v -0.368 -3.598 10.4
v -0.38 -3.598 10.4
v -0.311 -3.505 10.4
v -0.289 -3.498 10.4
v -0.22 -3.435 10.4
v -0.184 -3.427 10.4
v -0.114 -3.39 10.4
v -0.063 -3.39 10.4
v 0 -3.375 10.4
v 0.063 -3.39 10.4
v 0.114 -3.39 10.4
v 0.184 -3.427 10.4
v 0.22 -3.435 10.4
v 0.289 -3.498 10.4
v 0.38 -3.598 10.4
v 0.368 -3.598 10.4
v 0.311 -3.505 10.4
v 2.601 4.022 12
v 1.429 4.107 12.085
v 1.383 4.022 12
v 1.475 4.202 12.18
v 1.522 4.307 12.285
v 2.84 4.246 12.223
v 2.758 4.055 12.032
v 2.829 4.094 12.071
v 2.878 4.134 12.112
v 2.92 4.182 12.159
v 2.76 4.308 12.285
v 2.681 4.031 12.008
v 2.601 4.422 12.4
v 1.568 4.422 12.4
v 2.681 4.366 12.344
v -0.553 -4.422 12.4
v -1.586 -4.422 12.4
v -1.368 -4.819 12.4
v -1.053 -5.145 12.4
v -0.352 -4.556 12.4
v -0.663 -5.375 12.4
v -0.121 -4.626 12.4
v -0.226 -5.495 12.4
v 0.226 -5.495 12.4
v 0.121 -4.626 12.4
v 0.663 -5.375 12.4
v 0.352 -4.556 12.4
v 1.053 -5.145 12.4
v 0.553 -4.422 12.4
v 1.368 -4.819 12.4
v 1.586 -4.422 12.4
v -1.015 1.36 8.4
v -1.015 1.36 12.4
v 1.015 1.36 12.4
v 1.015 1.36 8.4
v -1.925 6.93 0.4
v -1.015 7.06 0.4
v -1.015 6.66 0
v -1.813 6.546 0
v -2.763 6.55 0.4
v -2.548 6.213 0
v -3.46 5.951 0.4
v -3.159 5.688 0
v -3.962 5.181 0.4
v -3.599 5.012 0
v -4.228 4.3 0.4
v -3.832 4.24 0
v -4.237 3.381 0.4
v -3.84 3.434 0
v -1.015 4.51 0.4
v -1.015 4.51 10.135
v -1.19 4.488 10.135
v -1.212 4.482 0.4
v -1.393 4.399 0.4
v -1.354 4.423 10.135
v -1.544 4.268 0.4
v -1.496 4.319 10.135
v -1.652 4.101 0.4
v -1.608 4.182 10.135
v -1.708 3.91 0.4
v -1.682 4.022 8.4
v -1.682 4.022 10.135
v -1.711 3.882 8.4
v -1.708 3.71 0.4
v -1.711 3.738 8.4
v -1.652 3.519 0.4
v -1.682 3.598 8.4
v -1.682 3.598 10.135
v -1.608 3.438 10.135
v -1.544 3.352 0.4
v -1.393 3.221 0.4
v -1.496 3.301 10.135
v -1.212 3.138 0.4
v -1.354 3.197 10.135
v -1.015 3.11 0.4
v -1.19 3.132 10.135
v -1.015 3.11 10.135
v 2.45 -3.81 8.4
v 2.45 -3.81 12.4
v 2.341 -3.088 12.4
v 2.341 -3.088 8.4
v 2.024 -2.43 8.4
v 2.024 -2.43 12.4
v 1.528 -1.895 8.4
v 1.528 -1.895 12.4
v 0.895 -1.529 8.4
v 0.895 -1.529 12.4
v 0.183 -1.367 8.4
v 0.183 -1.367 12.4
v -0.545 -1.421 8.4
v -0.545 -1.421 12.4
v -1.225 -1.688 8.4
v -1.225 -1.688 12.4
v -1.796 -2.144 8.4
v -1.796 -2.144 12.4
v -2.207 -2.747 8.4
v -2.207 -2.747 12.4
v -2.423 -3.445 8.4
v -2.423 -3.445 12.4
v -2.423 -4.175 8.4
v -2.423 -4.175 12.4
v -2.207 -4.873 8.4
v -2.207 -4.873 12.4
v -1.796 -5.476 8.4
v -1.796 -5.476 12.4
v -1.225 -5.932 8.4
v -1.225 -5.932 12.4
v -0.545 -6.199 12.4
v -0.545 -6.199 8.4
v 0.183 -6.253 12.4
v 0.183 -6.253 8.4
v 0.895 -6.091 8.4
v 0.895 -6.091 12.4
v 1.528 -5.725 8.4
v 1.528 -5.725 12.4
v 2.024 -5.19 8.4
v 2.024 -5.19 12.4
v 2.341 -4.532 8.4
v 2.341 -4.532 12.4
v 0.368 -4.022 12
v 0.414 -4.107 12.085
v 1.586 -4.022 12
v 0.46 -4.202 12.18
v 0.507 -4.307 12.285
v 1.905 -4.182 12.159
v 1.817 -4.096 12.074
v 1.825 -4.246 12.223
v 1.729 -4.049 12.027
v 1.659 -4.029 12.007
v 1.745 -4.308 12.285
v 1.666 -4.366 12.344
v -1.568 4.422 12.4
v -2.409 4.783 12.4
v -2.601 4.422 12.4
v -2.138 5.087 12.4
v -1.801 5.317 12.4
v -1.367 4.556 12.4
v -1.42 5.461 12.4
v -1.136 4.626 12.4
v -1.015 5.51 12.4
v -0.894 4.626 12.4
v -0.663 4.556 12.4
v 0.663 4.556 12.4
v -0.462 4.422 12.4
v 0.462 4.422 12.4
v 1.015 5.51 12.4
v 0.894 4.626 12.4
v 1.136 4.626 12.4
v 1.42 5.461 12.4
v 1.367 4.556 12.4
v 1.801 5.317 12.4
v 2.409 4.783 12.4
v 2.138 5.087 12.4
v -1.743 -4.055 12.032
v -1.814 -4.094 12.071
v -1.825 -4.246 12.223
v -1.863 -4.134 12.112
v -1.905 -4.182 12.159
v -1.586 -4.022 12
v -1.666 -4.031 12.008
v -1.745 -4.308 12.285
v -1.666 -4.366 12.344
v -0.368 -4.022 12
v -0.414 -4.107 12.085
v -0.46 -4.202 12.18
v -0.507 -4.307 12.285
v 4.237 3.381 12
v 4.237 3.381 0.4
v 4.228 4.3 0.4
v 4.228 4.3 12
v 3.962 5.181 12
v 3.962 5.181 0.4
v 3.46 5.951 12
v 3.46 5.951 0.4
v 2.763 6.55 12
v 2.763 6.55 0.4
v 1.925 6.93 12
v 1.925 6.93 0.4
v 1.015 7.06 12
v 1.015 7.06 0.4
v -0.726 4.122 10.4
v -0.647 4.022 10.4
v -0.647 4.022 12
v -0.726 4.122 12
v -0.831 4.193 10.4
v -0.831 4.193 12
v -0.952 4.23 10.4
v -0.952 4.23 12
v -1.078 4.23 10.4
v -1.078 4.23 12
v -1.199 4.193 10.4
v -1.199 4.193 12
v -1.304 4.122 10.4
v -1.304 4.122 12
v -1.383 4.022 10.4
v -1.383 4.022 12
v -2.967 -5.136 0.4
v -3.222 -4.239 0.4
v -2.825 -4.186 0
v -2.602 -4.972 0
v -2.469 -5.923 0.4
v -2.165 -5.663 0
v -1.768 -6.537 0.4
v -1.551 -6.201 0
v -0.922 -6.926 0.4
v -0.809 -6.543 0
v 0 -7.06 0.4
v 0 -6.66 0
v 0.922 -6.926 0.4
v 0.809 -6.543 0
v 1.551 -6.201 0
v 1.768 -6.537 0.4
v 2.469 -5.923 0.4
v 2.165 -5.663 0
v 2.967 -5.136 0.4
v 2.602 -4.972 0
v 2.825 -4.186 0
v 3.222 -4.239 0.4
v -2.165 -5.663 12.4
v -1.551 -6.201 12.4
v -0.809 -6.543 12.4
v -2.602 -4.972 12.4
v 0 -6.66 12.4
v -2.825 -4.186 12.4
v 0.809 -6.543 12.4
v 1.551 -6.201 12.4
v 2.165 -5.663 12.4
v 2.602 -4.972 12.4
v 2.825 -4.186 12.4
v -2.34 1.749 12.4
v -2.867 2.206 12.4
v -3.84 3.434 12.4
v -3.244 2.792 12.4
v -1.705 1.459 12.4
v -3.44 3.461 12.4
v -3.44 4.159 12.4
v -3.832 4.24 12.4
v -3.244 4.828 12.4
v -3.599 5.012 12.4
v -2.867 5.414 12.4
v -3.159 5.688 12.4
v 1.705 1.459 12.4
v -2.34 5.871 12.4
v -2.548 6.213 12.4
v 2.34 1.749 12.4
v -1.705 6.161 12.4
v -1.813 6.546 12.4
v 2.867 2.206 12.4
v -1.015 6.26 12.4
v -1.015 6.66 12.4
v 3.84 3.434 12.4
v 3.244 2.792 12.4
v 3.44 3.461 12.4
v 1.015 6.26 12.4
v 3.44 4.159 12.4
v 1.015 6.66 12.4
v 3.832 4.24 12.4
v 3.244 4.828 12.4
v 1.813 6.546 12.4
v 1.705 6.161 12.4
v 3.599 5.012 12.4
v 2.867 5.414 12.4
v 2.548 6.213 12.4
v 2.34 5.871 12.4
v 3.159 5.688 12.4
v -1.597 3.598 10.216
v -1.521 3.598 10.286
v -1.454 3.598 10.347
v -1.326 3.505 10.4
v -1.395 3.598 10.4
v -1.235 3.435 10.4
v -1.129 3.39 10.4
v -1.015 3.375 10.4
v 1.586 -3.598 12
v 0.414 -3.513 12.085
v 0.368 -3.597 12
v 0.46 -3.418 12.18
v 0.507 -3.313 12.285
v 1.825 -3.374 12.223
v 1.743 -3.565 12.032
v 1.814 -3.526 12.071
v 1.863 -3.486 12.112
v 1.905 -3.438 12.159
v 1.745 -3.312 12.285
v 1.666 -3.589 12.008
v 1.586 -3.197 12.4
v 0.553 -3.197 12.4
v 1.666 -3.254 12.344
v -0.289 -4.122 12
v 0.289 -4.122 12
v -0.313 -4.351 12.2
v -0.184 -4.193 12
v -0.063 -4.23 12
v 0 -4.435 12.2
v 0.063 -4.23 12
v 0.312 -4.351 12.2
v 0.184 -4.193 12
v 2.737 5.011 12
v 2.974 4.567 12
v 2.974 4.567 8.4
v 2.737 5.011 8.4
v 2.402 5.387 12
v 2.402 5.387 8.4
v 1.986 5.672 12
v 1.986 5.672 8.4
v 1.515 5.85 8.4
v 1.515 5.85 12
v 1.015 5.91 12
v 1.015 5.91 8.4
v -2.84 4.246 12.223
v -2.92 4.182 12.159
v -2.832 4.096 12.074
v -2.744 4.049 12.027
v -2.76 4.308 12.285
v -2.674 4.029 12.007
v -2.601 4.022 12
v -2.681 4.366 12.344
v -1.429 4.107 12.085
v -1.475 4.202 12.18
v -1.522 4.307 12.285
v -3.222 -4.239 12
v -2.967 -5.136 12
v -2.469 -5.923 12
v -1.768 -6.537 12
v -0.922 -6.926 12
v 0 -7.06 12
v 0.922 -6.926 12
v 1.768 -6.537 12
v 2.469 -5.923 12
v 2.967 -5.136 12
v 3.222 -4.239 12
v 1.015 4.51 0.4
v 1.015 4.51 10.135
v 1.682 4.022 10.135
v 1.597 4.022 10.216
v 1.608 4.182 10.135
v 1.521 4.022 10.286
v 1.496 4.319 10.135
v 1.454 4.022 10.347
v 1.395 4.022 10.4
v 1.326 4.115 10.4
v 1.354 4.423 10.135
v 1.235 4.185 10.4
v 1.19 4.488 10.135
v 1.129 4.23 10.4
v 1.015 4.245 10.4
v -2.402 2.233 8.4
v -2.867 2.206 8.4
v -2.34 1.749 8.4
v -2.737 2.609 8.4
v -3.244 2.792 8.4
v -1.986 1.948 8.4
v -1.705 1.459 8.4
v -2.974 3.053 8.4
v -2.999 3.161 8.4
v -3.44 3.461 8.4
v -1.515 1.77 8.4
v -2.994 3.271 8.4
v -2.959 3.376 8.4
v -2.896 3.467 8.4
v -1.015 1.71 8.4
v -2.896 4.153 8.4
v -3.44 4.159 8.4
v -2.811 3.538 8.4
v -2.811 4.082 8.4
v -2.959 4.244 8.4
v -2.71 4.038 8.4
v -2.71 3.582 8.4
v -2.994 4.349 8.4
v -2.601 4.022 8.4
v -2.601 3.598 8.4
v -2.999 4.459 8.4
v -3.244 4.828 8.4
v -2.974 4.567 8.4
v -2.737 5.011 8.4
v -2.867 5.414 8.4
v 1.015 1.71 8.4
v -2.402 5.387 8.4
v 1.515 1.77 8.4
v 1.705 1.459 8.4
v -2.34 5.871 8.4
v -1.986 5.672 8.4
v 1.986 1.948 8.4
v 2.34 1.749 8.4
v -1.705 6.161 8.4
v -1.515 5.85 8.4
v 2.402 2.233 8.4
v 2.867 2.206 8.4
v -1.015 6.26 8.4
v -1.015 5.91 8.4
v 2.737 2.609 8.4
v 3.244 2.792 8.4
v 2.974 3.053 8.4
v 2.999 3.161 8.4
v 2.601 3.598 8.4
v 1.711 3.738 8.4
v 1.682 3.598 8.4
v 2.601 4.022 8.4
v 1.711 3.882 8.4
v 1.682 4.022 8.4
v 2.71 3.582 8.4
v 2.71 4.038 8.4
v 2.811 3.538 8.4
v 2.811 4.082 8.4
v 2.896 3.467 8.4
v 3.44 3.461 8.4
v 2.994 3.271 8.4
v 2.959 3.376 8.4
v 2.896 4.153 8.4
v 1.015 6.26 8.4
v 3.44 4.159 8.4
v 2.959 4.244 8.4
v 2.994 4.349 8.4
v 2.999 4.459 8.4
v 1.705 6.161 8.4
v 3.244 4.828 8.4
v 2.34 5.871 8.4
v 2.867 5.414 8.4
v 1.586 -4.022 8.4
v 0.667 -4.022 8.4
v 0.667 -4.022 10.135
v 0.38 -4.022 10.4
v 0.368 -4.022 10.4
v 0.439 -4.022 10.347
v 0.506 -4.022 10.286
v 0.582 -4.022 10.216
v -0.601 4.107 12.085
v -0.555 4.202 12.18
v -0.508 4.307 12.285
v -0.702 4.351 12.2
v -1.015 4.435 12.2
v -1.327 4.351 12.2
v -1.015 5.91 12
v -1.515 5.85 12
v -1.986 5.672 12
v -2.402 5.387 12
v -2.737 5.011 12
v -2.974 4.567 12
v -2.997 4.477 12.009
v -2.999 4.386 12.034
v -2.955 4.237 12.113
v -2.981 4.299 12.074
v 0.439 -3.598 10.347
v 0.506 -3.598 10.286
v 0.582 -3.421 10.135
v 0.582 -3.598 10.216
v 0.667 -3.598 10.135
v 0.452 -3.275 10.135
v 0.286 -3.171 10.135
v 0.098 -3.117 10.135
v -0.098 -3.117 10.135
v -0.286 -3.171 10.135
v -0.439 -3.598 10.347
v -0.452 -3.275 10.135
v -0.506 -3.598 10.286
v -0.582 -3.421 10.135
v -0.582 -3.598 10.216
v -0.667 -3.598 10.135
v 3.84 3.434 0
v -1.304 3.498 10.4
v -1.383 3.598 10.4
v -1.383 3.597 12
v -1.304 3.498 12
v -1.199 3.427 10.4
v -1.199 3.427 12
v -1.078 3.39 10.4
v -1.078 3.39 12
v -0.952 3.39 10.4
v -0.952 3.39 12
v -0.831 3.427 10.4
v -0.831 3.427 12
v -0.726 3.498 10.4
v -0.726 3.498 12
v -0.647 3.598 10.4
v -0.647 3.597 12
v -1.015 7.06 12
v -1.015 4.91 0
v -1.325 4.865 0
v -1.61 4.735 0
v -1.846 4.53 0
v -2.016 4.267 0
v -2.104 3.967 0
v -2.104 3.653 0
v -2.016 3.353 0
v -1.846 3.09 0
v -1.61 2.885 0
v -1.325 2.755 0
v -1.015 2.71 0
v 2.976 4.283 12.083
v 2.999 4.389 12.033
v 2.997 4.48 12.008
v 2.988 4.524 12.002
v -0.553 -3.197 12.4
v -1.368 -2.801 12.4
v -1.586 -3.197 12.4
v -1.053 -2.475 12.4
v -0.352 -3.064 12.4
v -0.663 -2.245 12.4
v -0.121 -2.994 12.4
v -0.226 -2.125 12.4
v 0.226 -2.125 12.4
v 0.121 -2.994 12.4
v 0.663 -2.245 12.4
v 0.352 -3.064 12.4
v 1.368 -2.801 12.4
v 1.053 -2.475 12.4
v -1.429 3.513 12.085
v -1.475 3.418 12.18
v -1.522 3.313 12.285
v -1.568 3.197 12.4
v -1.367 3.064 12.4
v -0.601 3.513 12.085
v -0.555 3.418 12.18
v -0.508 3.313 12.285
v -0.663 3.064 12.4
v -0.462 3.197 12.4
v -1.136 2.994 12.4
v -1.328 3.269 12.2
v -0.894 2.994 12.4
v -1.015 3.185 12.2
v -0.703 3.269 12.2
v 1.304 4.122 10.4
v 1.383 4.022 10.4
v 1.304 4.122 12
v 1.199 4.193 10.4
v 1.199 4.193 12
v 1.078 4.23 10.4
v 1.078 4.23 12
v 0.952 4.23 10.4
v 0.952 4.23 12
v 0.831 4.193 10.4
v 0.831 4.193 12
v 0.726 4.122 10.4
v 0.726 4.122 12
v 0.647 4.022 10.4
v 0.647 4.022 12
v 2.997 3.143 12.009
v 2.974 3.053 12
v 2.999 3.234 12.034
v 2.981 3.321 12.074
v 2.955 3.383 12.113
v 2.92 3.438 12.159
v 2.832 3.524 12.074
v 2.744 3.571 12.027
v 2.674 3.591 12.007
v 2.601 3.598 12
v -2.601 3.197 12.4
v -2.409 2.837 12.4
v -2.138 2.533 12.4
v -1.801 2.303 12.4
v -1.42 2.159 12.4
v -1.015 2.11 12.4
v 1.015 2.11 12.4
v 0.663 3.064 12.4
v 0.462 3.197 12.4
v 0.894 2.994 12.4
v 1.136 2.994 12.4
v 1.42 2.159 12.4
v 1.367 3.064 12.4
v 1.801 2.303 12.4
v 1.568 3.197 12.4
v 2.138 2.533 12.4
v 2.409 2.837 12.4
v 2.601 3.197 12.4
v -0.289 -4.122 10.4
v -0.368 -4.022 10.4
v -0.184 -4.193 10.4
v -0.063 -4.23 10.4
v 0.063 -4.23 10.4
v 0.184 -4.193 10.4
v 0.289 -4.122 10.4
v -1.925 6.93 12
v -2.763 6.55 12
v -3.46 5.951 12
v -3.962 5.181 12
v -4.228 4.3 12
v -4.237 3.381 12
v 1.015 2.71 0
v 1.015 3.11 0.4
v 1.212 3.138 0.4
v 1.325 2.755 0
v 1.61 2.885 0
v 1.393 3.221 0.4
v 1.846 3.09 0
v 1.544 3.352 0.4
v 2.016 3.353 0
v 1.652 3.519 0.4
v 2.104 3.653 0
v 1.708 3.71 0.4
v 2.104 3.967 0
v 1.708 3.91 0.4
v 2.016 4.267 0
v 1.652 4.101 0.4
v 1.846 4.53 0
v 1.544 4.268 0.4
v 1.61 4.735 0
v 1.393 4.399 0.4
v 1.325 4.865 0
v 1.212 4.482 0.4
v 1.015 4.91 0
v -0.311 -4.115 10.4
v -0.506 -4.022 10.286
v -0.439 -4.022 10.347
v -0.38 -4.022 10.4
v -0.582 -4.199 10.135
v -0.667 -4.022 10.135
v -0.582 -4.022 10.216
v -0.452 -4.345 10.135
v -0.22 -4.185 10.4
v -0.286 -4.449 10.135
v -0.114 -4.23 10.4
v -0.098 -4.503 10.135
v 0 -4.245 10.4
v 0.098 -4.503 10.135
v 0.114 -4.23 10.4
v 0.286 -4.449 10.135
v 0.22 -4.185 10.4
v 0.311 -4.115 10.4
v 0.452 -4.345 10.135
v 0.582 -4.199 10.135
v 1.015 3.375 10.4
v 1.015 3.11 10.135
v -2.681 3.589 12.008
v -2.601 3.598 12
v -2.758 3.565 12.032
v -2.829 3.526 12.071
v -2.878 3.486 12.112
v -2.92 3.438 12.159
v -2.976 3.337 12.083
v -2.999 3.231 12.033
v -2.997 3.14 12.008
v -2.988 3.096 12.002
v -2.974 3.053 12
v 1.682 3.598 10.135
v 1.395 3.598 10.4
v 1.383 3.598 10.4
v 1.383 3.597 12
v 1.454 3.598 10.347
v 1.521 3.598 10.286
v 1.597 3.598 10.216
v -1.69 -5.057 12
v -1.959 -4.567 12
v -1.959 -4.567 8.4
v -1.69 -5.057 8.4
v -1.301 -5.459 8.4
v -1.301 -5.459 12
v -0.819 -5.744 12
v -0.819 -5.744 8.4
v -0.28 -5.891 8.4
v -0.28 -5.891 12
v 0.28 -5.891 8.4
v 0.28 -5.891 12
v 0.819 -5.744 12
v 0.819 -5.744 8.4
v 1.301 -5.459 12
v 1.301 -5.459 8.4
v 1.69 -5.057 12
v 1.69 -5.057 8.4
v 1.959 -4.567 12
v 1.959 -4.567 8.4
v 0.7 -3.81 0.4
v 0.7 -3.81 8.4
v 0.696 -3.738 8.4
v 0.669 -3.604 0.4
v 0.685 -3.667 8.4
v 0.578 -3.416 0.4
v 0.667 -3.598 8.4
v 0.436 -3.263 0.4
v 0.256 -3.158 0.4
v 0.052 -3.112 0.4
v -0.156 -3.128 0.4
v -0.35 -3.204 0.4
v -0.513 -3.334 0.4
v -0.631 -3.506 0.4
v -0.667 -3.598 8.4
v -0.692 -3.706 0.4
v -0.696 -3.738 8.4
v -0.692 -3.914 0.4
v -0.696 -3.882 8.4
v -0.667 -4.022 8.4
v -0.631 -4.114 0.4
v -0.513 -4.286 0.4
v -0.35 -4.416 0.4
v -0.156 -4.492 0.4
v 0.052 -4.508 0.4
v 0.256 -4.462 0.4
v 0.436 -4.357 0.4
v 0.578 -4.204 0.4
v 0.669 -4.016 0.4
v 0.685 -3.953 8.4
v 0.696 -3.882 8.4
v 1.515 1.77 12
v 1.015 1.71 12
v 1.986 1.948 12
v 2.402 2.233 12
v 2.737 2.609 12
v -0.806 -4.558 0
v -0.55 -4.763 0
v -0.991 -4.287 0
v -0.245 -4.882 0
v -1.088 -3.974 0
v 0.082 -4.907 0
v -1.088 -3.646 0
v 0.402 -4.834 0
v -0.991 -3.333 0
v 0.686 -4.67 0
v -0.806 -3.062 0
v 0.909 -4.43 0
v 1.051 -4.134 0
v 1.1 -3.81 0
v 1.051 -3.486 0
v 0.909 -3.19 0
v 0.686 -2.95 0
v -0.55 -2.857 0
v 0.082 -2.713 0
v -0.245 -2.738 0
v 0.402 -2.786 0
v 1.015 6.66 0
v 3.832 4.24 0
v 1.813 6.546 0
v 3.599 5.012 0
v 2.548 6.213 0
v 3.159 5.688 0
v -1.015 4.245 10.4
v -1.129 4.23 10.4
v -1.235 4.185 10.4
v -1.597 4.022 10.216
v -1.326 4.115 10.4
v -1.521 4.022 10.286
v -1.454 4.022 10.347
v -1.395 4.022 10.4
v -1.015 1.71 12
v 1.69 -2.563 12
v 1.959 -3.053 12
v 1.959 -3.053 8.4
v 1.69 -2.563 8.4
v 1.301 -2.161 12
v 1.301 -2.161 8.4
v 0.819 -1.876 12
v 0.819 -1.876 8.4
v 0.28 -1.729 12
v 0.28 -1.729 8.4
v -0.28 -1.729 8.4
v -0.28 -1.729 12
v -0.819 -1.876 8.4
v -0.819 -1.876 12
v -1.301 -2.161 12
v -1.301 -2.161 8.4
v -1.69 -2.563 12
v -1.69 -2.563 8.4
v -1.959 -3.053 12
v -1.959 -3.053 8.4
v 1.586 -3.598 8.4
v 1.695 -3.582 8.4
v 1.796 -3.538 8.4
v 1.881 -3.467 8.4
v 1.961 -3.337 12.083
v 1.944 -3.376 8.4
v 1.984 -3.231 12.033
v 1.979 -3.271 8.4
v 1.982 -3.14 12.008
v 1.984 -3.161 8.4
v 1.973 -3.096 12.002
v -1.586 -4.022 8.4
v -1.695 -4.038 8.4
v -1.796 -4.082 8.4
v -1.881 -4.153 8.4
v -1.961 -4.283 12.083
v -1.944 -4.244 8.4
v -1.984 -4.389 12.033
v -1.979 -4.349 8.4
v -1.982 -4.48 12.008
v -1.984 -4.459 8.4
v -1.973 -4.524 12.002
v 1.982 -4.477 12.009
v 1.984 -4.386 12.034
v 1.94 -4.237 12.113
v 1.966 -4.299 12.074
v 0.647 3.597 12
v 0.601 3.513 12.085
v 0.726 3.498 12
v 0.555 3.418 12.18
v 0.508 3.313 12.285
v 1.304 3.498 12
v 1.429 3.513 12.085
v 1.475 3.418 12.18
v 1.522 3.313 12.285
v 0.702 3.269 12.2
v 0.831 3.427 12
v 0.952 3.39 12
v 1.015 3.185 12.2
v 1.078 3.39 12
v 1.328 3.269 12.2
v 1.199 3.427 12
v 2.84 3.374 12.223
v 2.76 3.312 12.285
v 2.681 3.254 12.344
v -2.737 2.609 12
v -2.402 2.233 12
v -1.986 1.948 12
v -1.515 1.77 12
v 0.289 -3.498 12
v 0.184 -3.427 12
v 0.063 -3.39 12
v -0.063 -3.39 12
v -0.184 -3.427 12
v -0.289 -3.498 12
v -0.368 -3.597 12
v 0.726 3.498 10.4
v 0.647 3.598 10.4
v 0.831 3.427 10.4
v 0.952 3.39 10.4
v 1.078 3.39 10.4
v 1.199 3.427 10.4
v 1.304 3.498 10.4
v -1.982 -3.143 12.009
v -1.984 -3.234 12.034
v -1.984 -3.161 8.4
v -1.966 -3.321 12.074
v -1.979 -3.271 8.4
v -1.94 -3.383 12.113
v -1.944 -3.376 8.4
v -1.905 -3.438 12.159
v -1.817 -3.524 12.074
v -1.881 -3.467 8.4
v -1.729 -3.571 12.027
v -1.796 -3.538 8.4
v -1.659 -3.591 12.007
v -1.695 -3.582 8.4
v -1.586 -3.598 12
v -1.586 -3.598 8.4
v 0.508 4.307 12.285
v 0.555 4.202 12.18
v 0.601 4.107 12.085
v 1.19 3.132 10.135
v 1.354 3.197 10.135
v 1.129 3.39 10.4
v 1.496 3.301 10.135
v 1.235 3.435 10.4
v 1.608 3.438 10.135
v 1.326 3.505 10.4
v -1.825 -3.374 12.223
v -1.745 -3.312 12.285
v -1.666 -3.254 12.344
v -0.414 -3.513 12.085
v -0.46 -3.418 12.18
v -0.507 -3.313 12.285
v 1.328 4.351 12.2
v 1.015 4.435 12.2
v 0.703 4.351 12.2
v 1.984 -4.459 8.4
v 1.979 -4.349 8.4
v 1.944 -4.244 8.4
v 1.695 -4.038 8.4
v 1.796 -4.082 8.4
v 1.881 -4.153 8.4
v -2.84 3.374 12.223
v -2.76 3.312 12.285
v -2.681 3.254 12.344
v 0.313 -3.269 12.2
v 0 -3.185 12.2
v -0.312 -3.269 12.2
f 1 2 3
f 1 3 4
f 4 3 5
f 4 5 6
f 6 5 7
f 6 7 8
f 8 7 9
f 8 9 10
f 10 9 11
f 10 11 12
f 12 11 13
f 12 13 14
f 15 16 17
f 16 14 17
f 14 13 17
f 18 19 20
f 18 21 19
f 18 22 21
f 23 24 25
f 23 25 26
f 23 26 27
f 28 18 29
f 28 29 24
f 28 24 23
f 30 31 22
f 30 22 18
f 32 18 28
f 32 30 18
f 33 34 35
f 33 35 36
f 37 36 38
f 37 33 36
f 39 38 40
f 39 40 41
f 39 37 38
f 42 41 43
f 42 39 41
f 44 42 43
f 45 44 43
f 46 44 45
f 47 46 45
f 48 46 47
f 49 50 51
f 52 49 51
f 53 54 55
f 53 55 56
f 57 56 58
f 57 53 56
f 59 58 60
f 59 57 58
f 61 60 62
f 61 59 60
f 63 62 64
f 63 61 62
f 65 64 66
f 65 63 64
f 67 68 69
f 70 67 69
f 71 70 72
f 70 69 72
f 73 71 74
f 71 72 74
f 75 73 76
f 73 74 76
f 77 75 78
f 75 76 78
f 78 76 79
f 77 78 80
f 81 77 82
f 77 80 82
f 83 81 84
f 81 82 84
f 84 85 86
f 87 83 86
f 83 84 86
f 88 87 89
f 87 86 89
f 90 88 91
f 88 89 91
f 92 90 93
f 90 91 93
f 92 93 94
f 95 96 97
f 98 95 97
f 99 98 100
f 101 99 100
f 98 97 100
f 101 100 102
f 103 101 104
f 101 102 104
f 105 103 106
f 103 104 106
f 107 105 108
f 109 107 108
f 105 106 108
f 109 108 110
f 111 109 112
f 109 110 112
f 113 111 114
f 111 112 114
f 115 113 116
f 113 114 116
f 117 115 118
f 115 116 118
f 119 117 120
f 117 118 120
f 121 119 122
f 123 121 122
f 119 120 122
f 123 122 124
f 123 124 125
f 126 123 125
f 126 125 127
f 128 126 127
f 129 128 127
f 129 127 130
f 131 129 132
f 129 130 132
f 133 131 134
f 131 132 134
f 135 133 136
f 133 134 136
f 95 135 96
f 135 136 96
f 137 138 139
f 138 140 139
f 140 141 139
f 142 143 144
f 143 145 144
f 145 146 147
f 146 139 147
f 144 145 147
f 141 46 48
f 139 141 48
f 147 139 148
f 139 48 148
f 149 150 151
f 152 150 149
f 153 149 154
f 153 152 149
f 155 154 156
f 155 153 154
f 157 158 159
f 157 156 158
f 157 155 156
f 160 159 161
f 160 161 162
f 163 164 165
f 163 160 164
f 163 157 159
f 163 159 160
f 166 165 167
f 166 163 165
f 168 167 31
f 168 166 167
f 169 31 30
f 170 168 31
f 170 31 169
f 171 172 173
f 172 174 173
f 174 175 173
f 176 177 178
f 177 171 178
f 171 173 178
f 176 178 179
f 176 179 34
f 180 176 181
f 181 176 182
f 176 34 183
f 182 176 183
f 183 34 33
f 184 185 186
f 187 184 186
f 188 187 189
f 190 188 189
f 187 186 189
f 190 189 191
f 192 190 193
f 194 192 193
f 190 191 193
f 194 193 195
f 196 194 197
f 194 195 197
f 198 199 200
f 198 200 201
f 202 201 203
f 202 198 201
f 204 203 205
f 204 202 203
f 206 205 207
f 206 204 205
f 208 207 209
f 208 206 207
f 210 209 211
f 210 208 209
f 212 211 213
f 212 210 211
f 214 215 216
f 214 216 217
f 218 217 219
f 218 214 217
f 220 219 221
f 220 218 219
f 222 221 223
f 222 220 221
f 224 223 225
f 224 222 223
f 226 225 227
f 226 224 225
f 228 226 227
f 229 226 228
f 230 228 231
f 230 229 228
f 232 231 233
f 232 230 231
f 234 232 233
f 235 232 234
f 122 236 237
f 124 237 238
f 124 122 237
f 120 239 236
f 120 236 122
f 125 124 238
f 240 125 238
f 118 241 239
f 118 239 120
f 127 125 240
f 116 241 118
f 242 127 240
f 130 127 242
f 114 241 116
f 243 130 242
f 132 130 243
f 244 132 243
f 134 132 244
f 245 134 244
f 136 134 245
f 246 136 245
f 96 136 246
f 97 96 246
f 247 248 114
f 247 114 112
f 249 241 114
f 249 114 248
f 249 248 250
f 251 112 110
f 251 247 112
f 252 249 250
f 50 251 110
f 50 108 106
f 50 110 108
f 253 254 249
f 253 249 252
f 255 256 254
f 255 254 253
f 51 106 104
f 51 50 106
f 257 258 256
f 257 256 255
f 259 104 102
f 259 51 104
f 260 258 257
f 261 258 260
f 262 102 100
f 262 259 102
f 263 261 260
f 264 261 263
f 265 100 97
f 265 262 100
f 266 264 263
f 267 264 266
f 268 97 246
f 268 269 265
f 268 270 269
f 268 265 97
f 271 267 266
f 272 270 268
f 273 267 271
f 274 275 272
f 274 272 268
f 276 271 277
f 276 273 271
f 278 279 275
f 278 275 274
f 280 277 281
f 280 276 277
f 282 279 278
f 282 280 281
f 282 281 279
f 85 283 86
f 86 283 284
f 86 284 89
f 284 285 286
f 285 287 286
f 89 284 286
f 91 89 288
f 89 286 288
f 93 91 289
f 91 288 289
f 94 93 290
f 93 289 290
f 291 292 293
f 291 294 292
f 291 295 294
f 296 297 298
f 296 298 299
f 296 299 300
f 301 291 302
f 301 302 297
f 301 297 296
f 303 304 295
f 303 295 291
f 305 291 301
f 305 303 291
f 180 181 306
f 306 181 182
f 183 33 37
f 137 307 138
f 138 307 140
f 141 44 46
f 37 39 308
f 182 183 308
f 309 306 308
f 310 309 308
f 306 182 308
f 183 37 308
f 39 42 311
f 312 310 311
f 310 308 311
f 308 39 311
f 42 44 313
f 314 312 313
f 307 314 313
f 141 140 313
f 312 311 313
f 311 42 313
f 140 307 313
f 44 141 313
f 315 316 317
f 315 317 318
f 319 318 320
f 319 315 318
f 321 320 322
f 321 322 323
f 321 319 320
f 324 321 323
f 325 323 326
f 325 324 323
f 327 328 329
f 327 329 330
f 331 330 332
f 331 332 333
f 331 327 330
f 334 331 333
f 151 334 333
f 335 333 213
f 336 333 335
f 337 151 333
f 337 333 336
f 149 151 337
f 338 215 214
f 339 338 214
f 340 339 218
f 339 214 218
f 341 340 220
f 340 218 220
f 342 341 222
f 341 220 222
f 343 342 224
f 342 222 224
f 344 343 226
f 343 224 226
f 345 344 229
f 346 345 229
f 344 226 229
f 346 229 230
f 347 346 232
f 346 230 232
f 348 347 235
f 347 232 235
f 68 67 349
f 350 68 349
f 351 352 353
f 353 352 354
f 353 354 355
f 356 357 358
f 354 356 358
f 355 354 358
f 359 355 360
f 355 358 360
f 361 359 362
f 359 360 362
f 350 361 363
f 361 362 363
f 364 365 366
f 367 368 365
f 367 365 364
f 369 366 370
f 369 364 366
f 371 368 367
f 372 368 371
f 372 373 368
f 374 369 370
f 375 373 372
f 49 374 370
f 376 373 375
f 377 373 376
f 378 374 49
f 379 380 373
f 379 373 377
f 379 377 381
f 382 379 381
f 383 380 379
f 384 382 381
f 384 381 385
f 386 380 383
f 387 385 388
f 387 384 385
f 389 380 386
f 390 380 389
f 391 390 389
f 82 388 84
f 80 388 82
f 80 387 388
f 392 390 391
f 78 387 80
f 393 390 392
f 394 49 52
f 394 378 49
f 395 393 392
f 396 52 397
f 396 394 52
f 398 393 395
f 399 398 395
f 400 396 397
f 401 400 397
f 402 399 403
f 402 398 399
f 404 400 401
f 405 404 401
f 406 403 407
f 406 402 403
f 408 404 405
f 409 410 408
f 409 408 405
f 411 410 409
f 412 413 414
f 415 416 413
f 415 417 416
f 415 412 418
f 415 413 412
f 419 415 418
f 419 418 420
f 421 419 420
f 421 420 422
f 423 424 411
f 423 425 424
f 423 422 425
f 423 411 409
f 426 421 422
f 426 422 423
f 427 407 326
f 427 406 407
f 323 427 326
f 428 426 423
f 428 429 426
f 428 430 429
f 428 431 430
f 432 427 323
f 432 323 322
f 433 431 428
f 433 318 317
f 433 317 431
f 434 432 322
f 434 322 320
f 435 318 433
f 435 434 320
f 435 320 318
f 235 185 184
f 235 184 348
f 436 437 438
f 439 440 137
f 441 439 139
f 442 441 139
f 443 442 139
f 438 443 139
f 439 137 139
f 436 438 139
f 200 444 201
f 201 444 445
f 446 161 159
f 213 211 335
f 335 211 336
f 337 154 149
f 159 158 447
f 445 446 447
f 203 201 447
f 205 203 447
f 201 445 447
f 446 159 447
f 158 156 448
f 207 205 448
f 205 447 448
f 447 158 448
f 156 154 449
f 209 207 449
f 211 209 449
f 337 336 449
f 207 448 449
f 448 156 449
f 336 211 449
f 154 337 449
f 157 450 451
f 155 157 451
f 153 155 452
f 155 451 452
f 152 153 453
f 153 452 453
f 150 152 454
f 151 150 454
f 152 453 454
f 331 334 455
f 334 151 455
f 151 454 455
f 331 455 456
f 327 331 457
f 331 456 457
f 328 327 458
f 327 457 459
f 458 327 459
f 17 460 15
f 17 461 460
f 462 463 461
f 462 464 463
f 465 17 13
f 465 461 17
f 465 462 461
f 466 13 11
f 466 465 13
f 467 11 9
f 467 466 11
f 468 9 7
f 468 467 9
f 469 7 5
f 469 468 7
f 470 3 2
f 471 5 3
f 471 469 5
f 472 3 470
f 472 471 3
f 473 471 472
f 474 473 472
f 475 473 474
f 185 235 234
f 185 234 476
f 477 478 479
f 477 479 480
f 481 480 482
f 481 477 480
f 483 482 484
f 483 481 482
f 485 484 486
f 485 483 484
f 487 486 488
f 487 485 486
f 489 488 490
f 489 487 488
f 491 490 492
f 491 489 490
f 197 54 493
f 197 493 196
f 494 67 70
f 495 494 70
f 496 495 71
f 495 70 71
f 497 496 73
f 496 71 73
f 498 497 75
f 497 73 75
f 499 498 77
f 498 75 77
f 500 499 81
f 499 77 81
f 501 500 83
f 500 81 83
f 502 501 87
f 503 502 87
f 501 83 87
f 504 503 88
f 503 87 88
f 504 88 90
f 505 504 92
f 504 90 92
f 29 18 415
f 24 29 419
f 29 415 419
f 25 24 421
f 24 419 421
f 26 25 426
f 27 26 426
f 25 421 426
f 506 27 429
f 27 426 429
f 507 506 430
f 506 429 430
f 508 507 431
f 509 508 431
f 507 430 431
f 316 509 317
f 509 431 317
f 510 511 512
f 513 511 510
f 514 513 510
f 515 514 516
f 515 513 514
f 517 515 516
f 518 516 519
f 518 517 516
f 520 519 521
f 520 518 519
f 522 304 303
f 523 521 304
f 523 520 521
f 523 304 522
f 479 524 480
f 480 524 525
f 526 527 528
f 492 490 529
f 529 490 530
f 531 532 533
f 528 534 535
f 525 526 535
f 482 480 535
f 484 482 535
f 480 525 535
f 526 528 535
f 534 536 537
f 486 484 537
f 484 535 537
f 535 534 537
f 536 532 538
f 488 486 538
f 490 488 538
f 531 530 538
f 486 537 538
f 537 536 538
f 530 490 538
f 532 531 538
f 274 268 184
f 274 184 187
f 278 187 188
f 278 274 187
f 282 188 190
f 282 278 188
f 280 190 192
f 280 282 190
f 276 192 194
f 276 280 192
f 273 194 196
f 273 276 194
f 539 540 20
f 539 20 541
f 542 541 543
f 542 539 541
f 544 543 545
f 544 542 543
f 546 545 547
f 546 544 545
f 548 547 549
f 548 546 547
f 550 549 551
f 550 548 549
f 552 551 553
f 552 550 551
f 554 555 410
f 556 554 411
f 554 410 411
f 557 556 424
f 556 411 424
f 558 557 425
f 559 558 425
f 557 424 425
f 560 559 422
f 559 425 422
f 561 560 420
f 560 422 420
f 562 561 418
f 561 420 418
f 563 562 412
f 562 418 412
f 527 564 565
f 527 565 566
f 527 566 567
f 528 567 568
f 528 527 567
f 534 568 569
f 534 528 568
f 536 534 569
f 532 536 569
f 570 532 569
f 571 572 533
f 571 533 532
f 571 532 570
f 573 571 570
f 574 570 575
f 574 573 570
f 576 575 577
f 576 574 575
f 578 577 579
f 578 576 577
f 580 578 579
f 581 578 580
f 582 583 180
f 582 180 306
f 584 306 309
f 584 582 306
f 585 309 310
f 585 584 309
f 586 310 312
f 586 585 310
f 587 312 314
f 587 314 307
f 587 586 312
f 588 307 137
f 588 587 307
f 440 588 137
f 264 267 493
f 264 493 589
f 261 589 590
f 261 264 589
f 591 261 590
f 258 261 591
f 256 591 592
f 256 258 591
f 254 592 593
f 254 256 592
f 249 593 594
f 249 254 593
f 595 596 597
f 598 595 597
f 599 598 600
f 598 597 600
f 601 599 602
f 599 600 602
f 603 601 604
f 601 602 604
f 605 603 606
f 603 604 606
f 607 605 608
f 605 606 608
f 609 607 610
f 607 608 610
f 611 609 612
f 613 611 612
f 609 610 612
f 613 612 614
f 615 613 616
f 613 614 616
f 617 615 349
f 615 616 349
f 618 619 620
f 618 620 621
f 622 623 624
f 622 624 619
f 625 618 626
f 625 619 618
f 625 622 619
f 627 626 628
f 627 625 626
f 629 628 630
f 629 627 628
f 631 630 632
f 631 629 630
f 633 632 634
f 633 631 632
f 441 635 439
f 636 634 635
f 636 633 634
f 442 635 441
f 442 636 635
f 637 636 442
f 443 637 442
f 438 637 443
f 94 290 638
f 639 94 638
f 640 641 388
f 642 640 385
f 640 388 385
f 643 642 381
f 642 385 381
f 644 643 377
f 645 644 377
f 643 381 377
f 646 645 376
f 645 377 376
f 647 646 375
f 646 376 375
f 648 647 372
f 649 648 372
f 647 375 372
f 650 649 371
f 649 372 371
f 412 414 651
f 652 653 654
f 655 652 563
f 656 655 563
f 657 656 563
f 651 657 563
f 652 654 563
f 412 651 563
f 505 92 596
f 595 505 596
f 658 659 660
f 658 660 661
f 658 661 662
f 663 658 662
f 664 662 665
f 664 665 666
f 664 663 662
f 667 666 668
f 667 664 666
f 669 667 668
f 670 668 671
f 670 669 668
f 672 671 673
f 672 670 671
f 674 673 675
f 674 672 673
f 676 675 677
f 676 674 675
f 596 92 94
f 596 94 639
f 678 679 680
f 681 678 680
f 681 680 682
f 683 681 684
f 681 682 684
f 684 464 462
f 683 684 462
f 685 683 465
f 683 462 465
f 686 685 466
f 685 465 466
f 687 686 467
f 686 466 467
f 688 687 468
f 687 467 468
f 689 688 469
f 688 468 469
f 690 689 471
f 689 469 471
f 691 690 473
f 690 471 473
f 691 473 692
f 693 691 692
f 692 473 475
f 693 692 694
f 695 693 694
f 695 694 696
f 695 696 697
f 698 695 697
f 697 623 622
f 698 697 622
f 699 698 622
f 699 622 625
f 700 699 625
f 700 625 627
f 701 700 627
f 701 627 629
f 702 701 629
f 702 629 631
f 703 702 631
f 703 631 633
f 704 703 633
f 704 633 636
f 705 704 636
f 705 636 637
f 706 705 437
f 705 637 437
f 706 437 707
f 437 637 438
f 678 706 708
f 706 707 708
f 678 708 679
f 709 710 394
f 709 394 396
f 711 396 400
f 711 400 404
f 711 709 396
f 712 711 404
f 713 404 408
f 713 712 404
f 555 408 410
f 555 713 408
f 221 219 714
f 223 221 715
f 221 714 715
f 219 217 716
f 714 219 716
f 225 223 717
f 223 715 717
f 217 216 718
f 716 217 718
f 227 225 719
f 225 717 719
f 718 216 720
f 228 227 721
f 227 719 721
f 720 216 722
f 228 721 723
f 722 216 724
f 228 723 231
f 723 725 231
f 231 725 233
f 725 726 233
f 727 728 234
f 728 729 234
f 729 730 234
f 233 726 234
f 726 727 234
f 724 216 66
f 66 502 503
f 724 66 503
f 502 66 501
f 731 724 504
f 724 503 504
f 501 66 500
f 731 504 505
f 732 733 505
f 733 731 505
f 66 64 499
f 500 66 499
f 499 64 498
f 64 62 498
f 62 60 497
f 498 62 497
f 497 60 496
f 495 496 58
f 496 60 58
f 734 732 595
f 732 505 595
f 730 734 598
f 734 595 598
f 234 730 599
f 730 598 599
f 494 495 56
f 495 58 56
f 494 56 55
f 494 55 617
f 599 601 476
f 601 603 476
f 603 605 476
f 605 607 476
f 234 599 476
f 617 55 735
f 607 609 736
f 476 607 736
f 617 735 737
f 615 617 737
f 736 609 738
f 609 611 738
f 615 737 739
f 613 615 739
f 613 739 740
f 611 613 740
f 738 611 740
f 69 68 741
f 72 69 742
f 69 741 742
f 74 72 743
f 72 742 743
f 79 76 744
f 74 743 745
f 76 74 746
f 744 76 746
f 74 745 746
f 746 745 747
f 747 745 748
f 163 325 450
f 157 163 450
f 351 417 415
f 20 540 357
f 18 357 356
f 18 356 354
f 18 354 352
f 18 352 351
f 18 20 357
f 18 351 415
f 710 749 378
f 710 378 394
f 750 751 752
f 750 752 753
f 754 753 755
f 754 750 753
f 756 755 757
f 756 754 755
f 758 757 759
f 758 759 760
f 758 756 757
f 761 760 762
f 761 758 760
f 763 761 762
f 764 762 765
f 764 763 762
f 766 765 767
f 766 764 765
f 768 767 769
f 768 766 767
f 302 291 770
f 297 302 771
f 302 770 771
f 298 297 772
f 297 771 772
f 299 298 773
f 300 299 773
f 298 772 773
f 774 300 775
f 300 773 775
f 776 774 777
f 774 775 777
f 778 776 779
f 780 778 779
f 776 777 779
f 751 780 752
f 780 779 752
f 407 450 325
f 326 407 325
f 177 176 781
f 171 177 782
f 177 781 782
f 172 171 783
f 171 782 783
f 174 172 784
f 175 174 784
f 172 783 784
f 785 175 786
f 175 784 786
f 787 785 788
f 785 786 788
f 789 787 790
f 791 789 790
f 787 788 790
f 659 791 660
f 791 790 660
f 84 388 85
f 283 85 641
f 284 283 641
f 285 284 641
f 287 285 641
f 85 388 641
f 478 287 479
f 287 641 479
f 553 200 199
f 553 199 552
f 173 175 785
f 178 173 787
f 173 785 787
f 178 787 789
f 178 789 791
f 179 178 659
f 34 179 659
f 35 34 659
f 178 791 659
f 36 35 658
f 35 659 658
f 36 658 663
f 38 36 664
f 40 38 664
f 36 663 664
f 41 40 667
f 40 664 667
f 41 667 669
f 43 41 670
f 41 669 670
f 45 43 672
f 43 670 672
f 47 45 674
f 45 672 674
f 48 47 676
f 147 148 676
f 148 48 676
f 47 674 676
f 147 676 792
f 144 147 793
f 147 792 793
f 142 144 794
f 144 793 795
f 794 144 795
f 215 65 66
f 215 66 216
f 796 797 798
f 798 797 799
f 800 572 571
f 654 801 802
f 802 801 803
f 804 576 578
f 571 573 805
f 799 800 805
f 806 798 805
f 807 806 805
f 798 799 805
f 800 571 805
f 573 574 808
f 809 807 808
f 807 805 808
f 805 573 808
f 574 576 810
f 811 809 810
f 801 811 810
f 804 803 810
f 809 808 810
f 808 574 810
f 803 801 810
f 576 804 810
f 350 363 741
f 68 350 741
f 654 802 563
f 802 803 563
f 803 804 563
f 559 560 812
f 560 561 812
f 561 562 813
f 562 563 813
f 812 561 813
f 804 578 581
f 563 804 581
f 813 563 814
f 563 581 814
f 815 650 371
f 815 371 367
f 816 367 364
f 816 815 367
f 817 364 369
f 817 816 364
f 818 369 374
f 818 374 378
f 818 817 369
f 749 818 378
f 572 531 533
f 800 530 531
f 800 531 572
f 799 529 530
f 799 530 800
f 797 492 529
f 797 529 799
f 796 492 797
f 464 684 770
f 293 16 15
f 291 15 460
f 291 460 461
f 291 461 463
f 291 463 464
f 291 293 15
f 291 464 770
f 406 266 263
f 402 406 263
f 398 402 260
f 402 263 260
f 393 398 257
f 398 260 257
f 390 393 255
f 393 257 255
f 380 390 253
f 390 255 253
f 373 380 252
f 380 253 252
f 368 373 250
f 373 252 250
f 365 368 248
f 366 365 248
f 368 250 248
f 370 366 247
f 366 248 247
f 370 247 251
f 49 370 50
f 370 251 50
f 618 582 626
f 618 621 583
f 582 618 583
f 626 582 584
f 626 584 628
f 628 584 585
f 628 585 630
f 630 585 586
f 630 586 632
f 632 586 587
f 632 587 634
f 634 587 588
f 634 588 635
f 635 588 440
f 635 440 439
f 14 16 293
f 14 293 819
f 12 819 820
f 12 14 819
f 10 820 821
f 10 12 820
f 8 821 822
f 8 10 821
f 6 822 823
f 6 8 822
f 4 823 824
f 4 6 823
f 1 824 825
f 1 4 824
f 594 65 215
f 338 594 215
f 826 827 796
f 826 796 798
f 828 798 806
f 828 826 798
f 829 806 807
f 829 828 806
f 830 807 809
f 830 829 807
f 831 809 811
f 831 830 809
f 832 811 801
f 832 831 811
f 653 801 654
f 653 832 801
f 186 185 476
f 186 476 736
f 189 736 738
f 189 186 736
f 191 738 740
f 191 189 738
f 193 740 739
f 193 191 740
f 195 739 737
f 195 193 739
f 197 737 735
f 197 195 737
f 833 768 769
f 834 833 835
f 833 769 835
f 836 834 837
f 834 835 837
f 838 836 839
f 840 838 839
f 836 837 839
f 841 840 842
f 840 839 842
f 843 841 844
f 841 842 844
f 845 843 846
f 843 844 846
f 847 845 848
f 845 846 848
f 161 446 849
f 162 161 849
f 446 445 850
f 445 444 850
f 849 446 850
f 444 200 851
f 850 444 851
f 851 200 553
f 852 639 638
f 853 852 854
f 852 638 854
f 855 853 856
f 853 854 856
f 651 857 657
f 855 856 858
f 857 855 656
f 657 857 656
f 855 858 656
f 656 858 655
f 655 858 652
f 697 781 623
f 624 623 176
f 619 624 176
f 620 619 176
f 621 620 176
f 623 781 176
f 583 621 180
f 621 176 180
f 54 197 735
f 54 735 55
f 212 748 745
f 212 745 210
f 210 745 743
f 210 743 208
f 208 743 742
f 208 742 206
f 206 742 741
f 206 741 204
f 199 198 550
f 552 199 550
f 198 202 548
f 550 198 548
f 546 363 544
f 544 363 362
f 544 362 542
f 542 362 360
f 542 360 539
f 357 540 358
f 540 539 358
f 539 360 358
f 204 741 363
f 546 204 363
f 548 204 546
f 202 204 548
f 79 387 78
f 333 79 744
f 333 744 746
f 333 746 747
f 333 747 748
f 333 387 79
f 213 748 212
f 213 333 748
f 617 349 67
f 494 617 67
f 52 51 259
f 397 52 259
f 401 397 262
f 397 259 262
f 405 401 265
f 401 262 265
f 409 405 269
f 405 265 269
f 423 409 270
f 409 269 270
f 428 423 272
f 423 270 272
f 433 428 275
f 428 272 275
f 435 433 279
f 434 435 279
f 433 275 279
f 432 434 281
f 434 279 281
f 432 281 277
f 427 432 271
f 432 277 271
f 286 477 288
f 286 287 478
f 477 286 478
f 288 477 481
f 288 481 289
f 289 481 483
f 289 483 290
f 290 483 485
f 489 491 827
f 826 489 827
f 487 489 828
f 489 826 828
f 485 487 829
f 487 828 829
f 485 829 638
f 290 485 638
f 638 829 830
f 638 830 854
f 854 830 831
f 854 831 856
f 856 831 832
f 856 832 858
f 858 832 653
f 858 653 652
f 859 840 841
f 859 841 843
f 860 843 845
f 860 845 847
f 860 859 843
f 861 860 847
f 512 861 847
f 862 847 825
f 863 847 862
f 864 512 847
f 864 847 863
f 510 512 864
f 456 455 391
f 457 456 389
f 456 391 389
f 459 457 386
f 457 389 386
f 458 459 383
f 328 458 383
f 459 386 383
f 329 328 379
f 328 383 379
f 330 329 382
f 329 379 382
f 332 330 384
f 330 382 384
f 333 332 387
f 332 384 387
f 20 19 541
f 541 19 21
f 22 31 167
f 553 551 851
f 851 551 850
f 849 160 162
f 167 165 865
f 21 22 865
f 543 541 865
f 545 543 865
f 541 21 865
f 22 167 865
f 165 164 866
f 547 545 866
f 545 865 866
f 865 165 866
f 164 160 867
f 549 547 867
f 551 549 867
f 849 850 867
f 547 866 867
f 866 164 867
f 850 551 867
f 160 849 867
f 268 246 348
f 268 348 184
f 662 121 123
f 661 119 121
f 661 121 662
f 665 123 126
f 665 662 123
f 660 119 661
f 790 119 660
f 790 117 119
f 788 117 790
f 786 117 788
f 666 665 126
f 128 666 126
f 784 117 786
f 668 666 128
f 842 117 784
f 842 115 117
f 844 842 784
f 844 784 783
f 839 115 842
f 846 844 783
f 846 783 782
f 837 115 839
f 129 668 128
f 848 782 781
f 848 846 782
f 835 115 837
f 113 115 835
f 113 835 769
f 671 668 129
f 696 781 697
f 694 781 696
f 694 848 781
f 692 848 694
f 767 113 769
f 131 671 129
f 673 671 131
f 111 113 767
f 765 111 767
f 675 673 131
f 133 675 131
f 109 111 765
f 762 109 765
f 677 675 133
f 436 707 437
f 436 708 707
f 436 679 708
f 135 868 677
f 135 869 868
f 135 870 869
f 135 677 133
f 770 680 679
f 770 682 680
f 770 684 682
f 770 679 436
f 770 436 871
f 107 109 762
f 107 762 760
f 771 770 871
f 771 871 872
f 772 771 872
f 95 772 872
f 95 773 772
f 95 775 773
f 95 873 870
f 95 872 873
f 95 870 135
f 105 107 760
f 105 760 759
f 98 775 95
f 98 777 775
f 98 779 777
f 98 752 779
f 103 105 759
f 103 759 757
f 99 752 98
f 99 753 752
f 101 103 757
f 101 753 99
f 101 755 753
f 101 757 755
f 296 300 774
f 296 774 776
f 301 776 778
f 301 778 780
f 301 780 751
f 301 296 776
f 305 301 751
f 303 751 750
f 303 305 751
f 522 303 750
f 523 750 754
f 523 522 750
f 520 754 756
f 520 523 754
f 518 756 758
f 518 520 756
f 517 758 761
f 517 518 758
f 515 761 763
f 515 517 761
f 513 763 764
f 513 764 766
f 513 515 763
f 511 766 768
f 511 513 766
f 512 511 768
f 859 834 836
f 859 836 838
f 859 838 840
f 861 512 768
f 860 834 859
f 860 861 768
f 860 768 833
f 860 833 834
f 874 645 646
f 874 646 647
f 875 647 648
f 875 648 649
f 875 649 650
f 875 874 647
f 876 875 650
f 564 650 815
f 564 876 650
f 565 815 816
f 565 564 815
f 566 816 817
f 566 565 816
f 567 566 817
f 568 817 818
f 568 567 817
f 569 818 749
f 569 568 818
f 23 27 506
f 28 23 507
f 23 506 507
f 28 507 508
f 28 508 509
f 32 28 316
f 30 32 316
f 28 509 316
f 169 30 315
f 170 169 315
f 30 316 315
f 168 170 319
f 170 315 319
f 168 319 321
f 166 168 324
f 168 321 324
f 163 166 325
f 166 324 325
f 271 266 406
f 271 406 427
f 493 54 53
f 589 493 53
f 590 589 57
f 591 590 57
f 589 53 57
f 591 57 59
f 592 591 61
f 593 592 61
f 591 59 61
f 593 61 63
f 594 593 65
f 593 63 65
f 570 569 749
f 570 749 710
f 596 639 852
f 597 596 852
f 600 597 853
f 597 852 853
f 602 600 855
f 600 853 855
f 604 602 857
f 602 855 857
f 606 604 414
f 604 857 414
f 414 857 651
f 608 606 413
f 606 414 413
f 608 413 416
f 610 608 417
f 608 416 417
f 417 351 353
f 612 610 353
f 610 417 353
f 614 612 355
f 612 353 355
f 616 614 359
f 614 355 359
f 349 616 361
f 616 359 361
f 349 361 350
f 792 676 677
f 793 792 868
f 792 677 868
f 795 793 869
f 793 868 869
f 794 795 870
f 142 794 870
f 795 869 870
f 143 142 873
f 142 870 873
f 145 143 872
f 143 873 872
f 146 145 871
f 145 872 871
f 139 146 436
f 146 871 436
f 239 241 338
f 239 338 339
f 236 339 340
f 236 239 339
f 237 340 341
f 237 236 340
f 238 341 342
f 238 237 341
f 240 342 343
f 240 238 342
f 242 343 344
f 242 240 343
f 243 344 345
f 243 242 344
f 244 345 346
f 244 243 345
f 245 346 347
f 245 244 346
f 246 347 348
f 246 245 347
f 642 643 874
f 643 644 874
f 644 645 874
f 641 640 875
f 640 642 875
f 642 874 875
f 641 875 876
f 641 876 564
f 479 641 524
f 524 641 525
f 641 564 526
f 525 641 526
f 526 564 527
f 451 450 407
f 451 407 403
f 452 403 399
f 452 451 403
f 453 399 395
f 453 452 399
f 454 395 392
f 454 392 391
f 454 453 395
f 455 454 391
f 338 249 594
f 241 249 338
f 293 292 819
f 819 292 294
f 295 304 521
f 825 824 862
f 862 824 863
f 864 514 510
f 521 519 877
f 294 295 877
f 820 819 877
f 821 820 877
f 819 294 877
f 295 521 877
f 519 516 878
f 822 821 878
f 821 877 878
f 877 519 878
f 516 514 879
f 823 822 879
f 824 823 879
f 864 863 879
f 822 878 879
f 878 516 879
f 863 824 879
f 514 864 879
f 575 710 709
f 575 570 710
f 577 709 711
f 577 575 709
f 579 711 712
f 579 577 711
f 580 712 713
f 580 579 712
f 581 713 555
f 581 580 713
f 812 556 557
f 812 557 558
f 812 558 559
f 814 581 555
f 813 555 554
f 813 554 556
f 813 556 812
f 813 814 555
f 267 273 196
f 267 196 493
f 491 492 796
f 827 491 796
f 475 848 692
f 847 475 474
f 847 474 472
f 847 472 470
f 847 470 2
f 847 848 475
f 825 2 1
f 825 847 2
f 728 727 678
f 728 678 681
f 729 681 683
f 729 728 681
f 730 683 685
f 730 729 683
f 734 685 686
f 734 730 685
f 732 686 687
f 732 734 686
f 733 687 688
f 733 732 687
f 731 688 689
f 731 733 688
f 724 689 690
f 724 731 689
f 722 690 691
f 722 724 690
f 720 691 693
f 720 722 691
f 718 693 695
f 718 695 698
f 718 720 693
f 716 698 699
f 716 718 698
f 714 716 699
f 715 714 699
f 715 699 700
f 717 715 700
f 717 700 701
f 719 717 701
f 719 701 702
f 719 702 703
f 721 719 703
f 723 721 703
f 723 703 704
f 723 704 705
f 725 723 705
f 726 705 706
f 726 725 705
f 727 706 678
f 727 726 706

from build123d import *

# Parameters (mm, degrees)
SKETCH002_R     = 0.425
PAD001_DEPTH    = 12.4
CHAMFER001_SIZE = 0.4
SKETCH003_R     = 0.7
POCKET_DEPTH    = 10.401
CHAMFER_SIZE    = 0.265
SKETCH004_R     = 2.45
POCKET001_DEPTH = 4
CHAMFER002_SIZE = 0.4
FILLET_R        = 0.4


with BuildPart() as part:
    # Sketch002 → Pad001 (new body)
    with BuildSketch(Plane.XY):
        with BuildLine():
            ThreePointArc((-1.015, 7.06), (-3.46011, 5.951013), (-4.236546, 3.380883))
            Line((-4.236546, 3.380883), (-3.221546, -4.239117))
            ThreePointArc((-3.221546, -4.239117), (0, -7.06), (3.221546, -4.239117))
            Line((4.236546, 3.380883), (3.221546, -4.239117))
            ThreePointArc((4.236546, 3.380883), (3.46011, 5.951013), (1.015, 7.06))
            Line((-1.015, 7.06), (1.015, 7.06))
        make_face()
        with Locations((-1.015, 3.81)):
            Circle(SKETCH002_R, mode=Mode.SUBTRACT)
        with Locations((1.015, 3.81)):
            Circle(SKETCH002_R, mode=Mode.SUBTRACT)
        with Locations((0, -3.81)):
            Circle(SKETCH002_R, mode=Mode.SUBTRACT)
    extrude(amount=PAD001_DEPTH)

    # Chamfer001
    chamfer001_edges = [part.edges().sort_by_distance(p)[0] for p in [
        (-1.44, 3.81, 12.4),
        (0.59, 3.81, 12.4),
        (-0.425, -3.81, 12.4),
    ]]
    chamfer(chamfer001_edges, length=CHAMFER001_SIZE)

    # Sketch003 → Pocket (cut, through all)
    with BuildSketch(Plane.XY.offset(10.4)):
        with Locations((0, -3.81)):
            Circle(SKETCH003_R)
        with BuildLine():
            ThreePointArc((-1.015, 4.51), (-1.715, 3.81), (-1.015, 3.11))
            Line((-1.015, 3.11), (1.015, 3.11))
            ThreePointArc((1.015, 3.11), (1.715, 3.81), (1.015, 4.51))
            Line((-1.015, 4.51), (1.015, 4.51))
        make_face()
    extrude(amount=-POCKET_DEPTH, mode=Mode.SUBTRACT)

    # Chamfer
    chamfer_edges = [part.edges().sort_by_distance(p)[0] for p in [
        (1.715, 3.81, 10.4),
        (-0.7, -3.81, 10.4),
    ]]
    chamfer(chamfer_edges, length=CHAMFER_SIZE)

    # Sketch004 → Pocket001 (cut)
    with BuildSketch(Plane.XY.offset(12.4)):
        with Locations((0, -3.81)):
            Circle(SKETCH004_R)
        with BuildLine():
            ThreePointArc((2.089221, -3.5975), (0, -1.71), (-2.089221, -3.5975))
            Line((-2.089221, -3.5975), (2.089221, -3.5975))
        make_face(mode=Mode.SUBTRACT)
        with BuildLine():
            ThreePointArc((-2.089221, -4.0225), (0, -5.91), (2.089221, -4.0225))
            Line((-2.089221, -4.0225), (2.089221, -4.0225))
        make_face(mode=Mode.SUBTRACT)
        with BuildLine():
            ThreePointArc((-1.015, 6.26), (-3.465, 3.81), (-1.015, 1.36))
            Line((-1.015, 1.36), (1.015, 1.36))
            ThreePointArc((1.015, 1.36), (3.465, 3.81), (1.015, 6.26))
            Line((-1.015, 6.26), (1.015, 6.26))
        make_face()
        with BuildLine():
            Line((-1.015, 1.71), (1.015, 1.71))
            ThreePointArc((1.015, 1.71), (2.422793, 2.251754), (3.104225, 3.5975))
            Line((-3.104232, 3.5975), (3.104225, 3.5975))
            ThreePointArc((-3.104232, 3.5975), (-2.422798, 2.251752), (-1.015, 1.71))
        make_face(mode=Mode.SUBTRACT)
        with BuildLine():
            Line((-1.015, 5.91), (1.015, 5.91))
            ThreePointArc((3.104225, 4.0225), (2.422793, 5.368246), (1.015, 5.91))
            Line((-3.104232, 4.0225), (3.104225, 4.0225))
            ThreePointArc((-1.015, 5.91), (-2.422798, 5.368248), (-3.104232, 4.0225))
        make_face(mode=Mode.SUBTRACT)
    extrude(amount=-POCKET001_DEPTH, mode=Mode.SUBTRACT)

    # Chamfer002
    chamfer002_edges = [part.edges().sort_by_distance(p)[0] for p in [
        (-2.458197, 4.0225, 12.4),
        (0, 4.0225, 12.4),
        (2.458194, 4.0225, 12.4),
        (2.422793, 5.368246, 12.4),
        (2.422793, 2.251754, 12.4),
        (2.458194, 3.5975, 12.4),
        (0, 3.5975, 12.4),
        (-2.458197, 3.5975, 12.4),
        (-1.443192, -3.5975, 12.4),
        (1.443192, -3.5975, 12.4),
        (0, -1.71, 12.4),
        (1.443192, -4.0225, 12.4),
        (-1.443192, -4.0225, 12.4),
        (0, -5.91, 12.4),
        (3.46011, 5.951013, 0),
        (3.729046, -0.429117, 0),
        (0, 7.06, 0),
        (0, -7.06, 0),
        (-3.46011, 5.951013, 0),
        (-3.729046, -0.429117, 0),
        (-0.7, -3.81, 0),
        (-1.715, 3.81, 0),
        (0, 3.11, 0),
        (1.715, 3.81, 0),
        (0, 4.51, 0),
        (0, -7.06, 12.4),
    ]]
    chamfer(chamfer002_edges, length=CHAMFER002_SIZE)

    # Fillet
    fillet_edges = [part.edges().sort_by_distance(p)[0] for p in [
        (3.104225, 4.0225, 10.2),
        (-3.104232, 4.0225, 10.2),
        (-3.104232, 3.5975, 10.2),
        (-2.089221, -3.5975, 10.2),
        (-2.089221, -4.0225, 10.2),
        (3.104225, 3.5975, 10.2),
        (2.089221, -4.0225, 10.2),
        (2.089221, -3.5975, 10.2),
    ]]
    fillet(fillet_edges, radius=FILLET_R)


solid = part.part
